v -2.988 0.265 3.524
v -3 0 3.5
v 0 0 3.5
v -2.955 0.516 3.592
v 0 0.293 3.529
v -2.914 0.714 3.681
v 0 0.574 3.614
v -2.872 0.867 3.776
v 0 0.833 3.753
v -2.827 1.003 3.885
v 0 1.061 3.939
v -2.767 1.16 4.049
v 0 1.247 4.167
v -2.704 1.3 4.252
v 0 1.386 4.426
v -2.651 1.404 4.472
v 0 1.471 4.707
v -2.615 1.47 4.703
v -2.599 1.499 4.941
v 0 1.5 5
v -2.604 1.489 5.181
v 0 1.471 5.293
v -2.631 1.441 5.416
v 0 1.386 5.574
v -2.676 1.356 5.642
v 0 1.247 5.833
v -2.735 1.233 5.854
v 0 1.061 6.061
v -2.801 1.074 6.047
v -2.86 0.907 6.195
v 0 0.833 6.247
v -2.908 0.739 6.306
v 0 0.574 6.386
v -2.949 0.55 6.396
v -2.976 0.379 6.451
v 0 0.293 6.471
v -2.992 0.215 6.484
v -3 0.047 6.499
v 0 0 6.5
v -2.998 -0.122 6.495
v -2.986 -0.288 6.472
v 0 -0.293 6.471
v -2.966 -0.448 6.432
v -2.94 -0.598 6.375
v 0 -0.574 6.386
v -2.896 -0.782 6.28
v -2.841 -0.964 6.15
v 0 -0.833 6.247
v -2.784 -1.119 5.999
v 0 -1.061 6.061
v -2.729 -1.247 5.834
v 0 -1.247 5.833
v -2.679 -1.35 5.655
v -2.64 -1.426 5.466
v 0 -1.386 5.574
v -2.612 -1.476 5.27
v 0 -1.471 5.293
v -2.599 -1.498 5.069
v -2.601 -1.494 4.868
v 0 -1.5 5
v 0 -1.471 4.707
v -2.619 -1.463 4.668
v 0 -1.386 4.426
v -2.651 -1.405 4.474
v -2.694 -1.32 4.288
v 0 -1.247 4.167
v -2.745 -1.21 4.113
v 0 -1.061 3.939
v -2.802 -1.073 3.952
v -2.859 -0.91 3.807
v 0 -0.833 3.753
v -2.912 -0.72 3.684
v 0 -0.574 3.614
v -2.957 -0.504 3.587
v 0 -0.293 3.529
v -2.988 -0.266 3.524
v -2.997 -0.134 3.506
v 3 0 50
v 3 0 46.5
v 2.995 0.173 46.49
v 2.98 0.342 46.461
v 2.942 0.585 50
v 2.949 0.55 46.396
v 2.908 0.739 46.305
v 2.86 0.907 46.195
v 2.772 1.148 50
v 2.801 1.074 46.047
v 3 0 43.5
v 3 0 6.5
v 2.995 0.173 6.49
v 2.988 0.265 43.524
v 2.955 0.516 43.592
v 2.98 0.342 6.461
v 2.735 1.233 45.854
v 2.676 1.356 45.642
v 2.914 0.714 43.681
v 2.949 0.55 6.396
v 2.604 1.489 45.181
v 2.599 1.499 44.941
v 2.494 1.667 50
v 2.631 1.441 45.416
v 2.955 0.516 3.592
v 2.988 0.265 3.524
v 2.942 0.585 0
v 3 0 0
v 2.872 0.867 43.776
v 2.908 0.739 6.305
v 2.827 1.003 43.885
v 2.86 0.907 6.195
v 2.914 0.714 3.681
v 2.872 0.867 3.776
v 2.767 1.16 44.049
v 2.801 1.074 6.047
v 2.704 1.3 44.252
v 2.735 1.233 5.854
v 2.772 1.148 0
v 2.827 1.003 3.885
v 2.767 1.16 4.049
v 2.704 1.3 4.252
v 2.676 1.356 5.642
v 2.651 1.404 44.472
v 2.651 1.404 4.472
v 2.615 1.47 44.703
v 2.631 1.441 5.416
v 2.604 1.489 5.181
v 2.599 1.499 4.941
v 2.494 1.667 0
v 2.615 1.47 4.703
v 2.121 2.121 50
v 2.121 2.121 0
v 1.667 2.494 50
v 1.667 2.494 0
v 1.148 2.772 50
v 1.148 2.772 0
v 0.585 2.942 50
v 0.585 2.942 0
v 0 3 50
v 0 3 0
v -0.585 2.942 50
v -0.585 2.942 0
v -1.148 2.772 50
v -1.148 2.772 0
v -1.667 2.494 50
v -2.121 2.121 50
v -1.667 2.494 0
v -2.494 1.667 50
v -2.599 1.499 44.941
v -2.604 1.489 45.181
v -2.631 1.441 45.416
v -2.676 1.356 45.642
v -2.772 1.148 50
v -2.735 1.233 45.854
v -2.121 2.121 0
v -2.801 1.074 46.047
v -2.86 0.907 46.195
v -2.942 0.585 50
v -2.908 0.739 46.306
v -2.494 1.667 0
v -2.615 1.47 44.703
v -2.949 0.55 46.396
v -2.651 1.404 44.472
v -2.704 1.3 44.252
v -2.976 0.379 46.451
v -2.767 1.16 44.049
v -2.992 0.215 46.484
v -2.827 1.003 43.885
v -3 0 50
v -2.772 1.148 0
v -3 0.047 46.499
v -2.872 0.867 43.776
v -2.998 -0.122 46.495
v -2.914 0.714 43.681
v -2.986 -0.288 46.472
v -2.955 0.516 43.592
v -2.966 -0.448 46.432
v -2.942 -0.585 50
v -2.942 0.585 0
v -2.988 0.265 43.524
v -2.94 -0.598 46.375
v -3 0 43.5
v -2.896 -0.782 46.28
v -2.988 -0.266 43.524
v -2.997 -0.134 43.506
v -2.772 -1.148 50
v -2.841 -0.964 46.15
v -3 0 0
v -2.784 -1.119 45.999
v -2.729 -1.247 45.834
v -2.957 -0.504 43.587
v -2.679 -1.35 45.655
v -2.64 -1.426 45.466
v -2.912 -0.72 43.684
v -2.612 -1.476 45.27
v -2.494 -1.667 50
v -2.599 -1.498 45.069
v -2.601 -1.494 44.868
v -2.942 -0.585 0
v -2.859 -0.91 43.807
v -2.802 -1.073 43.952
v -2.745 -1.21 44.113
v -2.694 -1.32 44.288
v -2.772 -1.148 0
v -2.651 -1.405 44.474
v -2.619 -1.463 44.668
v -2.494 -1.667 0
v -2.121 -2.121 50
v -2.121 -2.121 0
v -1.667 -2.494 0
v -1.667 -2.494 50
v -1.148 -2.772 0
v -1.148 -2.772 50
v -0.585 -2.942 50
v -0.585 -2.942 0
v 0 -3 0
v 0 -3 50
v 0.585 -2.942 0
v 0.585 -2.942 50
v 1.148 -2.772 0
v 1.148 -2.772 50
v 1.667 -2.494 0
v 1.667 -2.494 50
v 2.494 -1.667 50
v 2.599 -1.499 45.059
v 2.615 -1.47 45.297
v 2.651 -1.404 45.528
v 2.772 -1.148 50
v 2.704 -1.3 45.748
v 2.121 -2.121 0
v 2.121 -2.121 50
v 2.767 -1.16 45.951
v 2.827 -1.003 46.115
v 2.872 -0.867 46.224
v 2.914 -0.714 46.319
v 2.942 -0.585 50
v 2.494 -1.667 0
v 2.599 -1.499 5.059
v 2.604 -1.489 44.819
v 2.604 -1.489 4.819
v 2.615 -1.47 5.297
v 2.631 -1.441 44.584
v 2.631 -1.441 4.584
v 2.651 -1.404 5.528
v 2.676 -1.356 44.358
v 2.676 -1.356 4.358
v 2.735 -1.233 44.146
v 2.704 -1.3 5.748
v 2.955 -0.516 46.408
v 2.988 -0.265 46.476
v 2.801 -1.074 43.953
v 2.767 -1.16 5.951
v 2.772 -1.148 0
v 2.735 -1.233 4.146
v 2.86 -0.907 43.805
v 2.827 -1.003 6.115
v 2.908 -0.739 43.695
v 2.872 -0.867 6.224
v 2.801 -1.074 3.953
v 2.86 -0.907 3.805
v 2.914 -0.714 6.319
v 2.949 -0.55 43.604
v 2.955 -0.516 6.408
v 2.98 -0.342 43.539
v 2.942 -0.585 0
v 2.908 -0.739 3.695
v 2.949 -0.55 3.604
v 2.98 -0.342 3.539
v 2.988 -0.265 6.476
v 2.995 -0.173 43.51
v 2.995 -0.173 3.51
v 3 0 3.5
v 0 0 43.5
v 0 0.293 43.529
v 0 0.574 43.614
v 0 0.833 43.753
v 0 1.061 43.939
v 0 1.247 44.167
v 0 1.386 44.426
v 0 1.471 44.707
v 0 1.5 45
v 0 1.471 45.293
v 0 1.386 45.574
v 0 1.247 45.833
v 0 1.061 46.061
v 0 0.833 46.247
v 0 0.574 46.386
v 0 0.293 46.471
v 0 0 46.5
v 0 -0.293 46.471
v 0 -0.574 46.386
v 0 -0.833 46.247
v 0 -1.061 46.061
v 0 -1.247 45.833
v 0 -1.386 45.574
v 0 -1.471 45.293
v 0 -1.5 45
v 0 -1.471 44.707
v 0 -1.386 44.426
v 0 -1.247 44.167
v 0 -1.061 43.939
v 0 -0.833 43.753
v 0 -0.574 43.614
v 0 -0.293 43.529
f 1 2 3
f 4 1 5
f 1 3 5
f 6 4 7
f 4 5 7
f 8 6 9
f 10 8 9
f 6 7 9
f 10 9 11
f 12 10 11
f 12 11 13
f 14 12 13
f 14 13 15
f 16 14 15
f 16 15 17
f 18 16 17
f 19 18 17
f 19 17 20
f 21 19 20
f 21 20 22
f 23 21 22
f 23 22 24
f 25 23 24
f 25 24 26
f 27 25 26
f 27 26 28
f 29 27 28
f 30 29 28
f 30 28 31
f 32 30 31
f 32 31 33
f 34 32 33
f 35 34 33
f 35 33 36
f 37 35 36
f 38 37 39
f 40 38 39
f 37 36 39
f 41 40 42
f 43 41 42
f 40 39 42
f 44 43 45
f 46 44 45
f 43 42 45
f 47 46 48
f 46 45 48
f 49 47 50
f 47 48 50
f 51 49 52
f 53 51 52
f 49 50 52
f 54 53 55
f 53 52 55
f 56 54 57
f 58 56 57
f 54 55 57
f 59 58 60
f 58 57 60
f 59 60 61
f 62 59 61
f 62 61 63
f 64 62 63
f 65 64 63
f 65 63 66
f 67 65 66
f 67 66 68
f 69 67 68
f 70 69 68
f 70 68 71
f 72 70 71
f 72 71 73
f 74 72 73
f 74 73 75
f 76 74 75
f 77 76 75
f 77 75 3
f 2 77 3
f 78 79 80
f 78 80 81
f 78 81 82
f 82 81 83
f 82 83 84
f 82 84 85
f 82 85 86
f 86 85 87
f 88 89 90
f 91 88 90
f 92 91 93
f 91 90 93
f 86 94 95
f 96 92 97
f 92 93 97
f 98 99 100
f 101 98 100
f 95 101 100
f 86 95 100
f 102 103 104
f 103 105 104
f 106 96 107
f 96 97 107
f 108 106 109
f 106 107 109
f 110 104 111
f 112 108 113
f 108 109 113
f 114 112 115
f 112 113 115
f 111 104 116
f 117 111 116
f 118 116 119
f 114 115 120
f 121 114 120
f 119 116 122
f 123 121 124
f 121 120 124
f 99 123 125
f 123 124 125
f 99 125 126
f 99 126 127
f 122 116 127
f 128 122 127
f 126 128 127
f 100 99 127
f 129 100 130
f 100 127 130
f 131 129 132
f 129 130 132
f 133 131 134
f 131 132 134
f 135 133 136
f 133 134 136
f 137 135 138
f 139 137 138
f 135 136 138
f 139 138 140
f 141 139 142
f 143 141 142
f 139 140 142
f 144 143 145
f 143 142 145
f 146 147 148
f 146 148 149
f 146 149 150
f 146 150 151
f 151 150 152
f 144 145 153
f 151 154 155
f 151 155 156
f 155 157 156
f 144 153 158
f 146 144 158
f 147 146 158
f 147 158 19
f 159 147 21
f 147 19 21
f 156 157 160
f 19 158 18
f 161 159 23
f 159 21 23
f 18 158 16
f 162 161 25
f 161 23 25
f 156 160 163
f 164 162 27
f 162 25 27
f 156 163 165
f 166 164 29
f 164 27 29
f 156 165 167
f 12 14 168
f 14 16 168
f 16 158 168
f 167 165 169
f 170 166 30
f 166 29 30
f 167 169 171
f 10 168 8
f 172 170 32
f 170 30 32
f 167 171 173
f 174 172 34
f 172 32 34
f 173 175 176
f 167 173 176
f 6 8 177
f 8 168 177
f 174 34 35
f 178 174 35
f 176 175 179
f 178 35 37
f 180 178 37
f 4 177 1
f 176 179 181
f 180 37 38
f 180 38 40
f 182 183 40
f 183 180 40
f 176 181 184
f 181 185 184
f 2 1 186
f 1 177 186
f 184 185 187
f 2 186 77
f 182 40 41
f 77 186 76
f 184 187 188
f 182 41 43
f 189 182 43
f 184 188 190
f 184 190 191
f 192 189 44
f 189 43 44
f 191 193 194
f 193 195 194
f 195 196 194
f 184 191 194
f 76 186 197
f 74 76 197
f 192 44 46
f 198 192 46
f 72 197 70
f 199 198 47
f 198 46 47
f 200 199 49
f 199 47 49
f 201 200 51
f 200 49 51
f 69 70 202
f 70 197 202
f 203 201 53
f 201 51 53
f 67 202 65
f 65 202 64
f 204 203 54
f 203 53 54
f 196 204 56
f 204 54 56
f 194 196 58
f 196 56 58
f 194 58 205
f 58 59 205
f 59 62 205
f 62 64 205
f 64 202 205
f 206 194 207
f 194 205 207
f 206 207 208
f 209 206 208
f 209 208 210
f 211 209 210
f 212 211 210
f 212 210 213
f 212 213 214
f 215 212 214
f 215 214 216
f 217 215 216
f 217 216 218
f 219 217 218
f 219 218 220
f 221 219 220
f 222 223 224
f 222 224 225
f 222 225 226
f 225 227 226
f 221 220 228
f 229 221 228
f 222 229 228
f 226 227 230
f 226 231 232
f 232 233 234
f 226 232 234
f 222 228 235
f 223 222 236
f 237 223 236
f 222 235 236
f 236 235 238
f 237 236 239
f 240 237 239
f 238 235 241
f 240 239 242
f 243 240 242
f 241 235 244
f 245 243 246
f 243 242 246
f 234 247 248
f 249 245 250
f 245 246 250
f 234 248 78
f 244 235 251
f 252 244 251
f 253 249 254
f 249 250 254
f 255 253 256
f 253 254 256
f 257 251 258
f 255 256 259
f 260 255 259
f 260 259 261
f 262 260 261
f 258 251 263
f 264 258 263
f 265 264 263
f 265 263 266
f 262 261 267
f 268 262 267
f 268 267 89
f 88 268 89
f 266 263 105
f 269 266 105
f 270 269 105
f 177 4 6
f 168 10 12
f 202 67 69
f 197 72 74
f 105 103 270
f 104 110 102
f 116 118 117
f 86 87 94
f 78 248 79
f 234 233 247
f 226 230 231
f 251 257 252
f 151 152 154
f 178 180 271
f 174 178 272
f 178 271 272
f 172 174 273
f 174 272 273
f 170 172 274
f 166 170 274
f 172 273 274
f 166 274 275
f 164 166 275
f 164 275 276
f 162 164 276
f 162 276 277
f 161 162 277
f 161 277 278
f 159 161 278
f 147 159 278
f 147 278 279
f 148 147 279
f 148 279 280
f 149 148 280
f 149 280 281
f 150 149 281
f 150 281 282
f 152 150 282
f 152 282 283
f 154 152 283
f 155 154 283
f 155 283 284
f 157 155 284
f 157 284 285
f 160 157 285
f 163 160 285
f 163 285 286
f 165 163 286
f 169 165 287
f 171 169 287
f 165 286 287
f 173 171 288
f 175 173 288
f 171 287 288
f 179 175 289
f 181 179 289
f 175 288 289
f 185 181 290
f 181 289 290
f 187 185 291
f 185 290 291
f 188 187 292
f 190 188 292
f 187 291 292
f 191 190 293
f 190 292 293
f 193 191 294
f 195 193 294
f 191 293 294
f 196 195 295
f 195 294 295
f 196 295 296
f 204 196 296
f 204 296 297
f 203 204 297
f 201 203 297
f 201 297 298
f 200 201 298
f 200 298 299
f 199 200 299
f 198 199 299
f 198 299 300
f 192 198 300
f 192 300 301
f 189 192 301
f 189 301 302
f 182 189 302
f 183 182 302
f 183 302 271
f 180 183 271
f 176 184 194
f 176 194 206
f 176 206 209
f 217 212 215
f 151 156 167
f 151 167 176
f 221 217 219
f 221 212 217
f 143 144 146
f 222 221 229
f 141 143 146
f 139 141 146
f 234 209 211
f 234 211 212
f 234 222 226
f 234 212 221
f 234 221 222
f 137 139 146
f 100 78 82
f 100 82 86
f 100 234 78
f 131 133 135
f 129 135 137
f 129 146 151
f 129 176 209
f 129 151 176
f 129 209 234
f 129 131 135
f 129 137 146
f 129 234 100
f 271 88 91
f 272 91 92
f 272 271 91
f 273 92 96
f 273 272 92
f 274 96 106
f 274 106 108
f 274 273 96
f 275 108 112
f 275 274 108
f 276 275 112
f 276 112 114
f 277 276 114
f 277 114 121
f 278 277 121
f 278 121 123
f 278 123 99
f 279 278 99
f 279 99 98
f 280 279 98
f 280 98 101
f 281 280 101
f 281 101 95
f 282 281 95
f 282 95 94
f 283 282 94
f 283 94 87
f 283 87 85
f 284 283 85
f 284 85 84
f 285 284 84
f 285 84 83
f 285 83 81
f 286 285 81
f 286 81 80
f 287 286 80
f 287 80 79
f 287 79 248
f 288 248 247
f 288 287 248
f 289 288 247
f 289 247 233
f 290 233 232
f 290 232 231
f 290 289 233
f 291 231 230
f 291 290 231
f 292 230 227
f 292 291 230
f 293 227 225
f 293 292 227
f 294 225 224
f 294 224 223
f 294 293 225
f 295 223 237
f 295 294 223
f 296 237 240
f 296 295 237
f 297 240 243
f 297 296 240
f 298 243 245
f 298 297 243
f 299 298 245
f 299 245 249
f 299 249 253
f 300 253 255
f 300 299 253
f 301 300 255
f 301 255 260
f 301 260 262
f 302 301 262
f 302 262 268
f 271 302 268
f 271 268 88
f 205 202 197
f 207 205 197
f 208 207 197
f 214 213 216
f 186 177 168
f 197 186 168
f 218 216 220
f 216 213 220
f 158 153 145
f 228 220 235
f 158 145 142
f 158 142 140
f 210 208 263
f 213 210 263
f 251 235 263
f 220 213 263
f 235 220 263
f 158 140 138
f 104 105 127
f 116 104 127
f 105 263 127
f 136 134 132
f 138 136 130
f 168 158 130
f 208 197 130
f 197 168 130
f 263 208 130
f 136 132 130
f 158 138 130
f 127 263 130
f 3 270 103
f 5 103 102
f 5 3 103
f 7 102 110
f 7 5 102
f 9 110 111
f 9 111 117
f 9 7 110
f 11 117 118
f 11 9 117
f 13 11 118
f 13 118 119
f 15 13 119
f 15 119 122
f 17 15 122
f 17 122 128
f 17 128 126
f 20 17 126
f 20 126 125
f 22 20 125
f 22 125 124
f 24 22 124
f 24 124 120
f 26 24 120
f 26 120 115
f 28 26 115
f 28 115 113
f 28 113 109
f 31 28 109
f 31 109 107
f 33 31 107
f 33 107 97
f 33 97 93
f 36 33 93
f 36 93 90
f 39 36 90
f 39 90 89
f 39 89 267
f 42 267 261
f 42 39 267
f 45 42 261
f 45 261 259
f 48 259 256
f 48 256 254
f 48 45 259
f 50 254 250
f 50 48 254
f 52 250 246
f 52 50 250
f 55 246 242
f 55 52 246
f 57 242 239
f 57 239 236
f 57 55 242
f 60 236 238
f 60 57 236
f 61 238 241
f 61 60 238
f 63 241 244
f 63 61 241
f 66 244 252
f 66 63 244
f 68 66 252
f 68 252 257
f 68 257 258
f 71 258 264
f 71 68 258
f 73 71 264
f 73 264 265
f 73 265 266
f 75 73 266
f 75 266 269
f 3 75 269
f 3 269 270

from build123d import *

# Parameters (mm, degrees)
SKETCH1_R               = 3
BOSS_EXTRUDE1_DEPTH     = 50
SKETCH2_R               = 1.5
CUT_EXTRUDE1_DEPTH      = 4
CUT_EXTRUDE1_DEPTH_BACK = 4


with BuildPart() as part:
    # Sketch1 → Boss-Extrude1 (new body)
    with BuildSketch(Plane.XY):
        Circle(SKETCH1_R)
    extrude(amount=BOSS_EXTRUDE1_DEPTH)

    # Sketch2 → Cut-Extrude1 (cut, two sides)
    with BuildSketch(Plane(origin=(0, 0, 0), x_dir=(0, 0, -1), z_dir=(1, 0, 0))) as cut_extrude1_sk:
        with Locations((-45, 0)):
            Circle(SKETCH2_R)
        with Locations((-5, 0)):
            Circle(SKETCH2_R)
    extrude(amount=CUT_EXTRUDE1_DEPTH, mode=Mode.SUBTRACT)
    extrude(cut_extrude1_sk.sketch, amount=-CUT_EXTRUDE1_DEPTH_BACK, mode=Mode.SUBTRACT)


solid = part.part
